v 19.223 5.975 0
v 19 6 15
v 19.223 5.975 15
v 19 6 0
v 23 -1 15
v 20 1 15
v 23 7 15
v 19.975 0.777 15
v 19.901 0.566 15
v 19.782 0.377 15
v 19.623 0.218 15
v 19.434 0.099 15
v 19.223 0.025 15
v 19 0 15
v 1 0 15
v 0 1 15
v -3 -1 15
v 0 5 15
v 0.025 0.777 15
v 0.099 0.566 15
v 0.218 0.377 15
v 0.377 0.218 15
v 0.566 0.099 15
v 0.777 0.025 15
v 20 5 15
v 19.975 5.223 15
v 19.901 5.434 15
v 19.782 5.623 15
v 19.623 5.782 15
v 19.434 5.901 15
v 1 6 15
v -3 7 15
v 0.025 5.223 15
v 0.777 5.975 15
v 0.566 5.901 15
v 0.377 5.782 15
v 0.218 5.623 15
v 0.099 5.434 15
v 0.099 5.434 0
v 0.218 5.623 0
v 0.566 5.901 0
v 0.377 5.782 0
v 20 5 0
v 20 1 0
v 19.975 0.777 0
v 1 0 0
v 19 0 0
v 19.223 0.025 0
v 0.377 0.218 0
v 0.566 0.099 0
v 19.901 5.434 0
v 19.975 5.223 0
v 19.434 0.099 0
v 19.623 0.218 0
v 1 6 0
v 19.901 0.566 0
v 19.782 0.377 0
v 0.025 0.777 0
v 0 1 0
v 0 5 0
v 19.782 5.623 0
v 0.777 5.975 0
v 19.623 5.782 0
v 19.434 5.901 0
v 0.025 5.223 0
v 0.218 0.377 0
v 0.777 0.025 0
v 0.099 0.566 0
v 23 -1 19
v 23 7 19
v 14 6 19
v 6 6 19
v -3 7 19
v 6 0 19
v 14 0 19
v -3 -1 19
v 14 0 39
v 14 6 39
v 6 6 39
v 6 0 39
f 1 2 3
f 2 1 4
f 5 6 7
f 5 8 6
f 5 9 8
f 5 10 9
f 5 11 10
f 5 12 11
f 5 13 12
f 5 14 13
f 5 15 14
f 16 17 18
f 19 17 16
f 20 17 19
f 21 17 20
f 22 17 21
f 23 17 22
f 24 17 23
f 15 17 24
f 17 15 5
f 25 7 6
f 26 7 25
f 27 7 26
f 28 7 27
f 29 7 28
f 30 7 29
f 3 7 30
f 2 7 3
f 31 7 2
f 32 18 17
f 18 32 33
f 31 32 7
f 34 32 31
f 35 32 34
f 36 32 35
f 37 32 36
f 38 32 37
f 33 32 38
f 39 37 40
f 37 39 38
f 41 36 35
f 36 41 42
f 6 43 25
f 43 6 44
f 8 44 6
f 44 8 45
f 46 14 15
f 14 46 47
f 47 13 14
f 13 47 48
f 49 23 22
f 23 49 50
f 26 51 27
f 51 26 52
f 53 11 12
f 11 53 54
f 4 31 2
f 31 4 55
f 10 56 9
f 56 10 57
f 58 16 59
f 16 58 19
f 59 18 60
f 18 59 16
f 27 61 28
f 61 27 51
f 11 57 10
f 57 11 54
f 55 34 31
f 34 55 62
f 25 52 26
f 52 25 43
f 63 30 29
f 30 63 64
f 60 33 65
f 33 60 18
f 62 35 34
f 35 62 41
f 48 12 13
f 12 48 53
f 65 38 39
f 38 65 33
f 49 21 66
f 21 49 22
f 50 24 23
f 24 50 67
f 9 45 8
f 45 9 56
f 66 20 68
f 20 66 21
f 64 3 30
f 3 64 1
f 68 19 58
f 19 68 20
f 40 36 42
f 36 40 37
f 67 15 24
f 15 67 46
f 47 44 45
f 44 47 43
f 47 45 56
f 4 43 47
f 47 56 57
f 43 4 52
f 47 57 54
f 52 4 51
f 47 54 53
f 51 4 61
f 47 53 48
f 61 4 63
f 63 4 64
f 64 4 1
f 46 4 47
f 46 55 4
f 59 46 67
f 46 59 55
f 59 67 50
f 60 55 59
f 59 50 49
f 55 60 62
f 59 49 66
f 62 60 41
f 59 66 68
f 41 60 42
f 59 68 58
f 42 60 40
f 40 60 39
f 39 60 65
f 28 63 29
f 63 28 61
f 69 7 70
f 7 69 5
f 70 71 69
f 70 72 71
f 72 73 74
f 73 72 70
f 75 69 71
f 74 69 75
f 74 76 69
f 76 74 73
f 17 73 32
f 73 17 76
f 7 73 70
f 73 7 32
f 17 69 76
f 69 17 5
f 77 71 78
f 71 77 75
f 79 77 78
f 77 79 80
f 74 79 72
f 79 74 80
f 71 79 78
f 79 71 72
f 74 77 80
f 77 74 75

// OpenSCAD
// Reset tool. The rounded 20 x 6 mm plug goes 15 mm into the mouth.
// Withdraw the gauge before starting the trial.
$fn = 28;
plug_width = 20;
plug_height = 6;
plug_depth = 15;
radius = 1;

hull() {
    for (x = [radius, plug_width - radius], y = [radius, plug_height - radius])
        translate([x, y, 0]) cylinder(h = plug_depth, r = radius);
}
translate([-3, -1, plug_depth]) cube([plug_width + 6, plug_height + 2, 4]);
translate([6, 0, plug_depth + 4]) cube([8, plug_height, 20]);
